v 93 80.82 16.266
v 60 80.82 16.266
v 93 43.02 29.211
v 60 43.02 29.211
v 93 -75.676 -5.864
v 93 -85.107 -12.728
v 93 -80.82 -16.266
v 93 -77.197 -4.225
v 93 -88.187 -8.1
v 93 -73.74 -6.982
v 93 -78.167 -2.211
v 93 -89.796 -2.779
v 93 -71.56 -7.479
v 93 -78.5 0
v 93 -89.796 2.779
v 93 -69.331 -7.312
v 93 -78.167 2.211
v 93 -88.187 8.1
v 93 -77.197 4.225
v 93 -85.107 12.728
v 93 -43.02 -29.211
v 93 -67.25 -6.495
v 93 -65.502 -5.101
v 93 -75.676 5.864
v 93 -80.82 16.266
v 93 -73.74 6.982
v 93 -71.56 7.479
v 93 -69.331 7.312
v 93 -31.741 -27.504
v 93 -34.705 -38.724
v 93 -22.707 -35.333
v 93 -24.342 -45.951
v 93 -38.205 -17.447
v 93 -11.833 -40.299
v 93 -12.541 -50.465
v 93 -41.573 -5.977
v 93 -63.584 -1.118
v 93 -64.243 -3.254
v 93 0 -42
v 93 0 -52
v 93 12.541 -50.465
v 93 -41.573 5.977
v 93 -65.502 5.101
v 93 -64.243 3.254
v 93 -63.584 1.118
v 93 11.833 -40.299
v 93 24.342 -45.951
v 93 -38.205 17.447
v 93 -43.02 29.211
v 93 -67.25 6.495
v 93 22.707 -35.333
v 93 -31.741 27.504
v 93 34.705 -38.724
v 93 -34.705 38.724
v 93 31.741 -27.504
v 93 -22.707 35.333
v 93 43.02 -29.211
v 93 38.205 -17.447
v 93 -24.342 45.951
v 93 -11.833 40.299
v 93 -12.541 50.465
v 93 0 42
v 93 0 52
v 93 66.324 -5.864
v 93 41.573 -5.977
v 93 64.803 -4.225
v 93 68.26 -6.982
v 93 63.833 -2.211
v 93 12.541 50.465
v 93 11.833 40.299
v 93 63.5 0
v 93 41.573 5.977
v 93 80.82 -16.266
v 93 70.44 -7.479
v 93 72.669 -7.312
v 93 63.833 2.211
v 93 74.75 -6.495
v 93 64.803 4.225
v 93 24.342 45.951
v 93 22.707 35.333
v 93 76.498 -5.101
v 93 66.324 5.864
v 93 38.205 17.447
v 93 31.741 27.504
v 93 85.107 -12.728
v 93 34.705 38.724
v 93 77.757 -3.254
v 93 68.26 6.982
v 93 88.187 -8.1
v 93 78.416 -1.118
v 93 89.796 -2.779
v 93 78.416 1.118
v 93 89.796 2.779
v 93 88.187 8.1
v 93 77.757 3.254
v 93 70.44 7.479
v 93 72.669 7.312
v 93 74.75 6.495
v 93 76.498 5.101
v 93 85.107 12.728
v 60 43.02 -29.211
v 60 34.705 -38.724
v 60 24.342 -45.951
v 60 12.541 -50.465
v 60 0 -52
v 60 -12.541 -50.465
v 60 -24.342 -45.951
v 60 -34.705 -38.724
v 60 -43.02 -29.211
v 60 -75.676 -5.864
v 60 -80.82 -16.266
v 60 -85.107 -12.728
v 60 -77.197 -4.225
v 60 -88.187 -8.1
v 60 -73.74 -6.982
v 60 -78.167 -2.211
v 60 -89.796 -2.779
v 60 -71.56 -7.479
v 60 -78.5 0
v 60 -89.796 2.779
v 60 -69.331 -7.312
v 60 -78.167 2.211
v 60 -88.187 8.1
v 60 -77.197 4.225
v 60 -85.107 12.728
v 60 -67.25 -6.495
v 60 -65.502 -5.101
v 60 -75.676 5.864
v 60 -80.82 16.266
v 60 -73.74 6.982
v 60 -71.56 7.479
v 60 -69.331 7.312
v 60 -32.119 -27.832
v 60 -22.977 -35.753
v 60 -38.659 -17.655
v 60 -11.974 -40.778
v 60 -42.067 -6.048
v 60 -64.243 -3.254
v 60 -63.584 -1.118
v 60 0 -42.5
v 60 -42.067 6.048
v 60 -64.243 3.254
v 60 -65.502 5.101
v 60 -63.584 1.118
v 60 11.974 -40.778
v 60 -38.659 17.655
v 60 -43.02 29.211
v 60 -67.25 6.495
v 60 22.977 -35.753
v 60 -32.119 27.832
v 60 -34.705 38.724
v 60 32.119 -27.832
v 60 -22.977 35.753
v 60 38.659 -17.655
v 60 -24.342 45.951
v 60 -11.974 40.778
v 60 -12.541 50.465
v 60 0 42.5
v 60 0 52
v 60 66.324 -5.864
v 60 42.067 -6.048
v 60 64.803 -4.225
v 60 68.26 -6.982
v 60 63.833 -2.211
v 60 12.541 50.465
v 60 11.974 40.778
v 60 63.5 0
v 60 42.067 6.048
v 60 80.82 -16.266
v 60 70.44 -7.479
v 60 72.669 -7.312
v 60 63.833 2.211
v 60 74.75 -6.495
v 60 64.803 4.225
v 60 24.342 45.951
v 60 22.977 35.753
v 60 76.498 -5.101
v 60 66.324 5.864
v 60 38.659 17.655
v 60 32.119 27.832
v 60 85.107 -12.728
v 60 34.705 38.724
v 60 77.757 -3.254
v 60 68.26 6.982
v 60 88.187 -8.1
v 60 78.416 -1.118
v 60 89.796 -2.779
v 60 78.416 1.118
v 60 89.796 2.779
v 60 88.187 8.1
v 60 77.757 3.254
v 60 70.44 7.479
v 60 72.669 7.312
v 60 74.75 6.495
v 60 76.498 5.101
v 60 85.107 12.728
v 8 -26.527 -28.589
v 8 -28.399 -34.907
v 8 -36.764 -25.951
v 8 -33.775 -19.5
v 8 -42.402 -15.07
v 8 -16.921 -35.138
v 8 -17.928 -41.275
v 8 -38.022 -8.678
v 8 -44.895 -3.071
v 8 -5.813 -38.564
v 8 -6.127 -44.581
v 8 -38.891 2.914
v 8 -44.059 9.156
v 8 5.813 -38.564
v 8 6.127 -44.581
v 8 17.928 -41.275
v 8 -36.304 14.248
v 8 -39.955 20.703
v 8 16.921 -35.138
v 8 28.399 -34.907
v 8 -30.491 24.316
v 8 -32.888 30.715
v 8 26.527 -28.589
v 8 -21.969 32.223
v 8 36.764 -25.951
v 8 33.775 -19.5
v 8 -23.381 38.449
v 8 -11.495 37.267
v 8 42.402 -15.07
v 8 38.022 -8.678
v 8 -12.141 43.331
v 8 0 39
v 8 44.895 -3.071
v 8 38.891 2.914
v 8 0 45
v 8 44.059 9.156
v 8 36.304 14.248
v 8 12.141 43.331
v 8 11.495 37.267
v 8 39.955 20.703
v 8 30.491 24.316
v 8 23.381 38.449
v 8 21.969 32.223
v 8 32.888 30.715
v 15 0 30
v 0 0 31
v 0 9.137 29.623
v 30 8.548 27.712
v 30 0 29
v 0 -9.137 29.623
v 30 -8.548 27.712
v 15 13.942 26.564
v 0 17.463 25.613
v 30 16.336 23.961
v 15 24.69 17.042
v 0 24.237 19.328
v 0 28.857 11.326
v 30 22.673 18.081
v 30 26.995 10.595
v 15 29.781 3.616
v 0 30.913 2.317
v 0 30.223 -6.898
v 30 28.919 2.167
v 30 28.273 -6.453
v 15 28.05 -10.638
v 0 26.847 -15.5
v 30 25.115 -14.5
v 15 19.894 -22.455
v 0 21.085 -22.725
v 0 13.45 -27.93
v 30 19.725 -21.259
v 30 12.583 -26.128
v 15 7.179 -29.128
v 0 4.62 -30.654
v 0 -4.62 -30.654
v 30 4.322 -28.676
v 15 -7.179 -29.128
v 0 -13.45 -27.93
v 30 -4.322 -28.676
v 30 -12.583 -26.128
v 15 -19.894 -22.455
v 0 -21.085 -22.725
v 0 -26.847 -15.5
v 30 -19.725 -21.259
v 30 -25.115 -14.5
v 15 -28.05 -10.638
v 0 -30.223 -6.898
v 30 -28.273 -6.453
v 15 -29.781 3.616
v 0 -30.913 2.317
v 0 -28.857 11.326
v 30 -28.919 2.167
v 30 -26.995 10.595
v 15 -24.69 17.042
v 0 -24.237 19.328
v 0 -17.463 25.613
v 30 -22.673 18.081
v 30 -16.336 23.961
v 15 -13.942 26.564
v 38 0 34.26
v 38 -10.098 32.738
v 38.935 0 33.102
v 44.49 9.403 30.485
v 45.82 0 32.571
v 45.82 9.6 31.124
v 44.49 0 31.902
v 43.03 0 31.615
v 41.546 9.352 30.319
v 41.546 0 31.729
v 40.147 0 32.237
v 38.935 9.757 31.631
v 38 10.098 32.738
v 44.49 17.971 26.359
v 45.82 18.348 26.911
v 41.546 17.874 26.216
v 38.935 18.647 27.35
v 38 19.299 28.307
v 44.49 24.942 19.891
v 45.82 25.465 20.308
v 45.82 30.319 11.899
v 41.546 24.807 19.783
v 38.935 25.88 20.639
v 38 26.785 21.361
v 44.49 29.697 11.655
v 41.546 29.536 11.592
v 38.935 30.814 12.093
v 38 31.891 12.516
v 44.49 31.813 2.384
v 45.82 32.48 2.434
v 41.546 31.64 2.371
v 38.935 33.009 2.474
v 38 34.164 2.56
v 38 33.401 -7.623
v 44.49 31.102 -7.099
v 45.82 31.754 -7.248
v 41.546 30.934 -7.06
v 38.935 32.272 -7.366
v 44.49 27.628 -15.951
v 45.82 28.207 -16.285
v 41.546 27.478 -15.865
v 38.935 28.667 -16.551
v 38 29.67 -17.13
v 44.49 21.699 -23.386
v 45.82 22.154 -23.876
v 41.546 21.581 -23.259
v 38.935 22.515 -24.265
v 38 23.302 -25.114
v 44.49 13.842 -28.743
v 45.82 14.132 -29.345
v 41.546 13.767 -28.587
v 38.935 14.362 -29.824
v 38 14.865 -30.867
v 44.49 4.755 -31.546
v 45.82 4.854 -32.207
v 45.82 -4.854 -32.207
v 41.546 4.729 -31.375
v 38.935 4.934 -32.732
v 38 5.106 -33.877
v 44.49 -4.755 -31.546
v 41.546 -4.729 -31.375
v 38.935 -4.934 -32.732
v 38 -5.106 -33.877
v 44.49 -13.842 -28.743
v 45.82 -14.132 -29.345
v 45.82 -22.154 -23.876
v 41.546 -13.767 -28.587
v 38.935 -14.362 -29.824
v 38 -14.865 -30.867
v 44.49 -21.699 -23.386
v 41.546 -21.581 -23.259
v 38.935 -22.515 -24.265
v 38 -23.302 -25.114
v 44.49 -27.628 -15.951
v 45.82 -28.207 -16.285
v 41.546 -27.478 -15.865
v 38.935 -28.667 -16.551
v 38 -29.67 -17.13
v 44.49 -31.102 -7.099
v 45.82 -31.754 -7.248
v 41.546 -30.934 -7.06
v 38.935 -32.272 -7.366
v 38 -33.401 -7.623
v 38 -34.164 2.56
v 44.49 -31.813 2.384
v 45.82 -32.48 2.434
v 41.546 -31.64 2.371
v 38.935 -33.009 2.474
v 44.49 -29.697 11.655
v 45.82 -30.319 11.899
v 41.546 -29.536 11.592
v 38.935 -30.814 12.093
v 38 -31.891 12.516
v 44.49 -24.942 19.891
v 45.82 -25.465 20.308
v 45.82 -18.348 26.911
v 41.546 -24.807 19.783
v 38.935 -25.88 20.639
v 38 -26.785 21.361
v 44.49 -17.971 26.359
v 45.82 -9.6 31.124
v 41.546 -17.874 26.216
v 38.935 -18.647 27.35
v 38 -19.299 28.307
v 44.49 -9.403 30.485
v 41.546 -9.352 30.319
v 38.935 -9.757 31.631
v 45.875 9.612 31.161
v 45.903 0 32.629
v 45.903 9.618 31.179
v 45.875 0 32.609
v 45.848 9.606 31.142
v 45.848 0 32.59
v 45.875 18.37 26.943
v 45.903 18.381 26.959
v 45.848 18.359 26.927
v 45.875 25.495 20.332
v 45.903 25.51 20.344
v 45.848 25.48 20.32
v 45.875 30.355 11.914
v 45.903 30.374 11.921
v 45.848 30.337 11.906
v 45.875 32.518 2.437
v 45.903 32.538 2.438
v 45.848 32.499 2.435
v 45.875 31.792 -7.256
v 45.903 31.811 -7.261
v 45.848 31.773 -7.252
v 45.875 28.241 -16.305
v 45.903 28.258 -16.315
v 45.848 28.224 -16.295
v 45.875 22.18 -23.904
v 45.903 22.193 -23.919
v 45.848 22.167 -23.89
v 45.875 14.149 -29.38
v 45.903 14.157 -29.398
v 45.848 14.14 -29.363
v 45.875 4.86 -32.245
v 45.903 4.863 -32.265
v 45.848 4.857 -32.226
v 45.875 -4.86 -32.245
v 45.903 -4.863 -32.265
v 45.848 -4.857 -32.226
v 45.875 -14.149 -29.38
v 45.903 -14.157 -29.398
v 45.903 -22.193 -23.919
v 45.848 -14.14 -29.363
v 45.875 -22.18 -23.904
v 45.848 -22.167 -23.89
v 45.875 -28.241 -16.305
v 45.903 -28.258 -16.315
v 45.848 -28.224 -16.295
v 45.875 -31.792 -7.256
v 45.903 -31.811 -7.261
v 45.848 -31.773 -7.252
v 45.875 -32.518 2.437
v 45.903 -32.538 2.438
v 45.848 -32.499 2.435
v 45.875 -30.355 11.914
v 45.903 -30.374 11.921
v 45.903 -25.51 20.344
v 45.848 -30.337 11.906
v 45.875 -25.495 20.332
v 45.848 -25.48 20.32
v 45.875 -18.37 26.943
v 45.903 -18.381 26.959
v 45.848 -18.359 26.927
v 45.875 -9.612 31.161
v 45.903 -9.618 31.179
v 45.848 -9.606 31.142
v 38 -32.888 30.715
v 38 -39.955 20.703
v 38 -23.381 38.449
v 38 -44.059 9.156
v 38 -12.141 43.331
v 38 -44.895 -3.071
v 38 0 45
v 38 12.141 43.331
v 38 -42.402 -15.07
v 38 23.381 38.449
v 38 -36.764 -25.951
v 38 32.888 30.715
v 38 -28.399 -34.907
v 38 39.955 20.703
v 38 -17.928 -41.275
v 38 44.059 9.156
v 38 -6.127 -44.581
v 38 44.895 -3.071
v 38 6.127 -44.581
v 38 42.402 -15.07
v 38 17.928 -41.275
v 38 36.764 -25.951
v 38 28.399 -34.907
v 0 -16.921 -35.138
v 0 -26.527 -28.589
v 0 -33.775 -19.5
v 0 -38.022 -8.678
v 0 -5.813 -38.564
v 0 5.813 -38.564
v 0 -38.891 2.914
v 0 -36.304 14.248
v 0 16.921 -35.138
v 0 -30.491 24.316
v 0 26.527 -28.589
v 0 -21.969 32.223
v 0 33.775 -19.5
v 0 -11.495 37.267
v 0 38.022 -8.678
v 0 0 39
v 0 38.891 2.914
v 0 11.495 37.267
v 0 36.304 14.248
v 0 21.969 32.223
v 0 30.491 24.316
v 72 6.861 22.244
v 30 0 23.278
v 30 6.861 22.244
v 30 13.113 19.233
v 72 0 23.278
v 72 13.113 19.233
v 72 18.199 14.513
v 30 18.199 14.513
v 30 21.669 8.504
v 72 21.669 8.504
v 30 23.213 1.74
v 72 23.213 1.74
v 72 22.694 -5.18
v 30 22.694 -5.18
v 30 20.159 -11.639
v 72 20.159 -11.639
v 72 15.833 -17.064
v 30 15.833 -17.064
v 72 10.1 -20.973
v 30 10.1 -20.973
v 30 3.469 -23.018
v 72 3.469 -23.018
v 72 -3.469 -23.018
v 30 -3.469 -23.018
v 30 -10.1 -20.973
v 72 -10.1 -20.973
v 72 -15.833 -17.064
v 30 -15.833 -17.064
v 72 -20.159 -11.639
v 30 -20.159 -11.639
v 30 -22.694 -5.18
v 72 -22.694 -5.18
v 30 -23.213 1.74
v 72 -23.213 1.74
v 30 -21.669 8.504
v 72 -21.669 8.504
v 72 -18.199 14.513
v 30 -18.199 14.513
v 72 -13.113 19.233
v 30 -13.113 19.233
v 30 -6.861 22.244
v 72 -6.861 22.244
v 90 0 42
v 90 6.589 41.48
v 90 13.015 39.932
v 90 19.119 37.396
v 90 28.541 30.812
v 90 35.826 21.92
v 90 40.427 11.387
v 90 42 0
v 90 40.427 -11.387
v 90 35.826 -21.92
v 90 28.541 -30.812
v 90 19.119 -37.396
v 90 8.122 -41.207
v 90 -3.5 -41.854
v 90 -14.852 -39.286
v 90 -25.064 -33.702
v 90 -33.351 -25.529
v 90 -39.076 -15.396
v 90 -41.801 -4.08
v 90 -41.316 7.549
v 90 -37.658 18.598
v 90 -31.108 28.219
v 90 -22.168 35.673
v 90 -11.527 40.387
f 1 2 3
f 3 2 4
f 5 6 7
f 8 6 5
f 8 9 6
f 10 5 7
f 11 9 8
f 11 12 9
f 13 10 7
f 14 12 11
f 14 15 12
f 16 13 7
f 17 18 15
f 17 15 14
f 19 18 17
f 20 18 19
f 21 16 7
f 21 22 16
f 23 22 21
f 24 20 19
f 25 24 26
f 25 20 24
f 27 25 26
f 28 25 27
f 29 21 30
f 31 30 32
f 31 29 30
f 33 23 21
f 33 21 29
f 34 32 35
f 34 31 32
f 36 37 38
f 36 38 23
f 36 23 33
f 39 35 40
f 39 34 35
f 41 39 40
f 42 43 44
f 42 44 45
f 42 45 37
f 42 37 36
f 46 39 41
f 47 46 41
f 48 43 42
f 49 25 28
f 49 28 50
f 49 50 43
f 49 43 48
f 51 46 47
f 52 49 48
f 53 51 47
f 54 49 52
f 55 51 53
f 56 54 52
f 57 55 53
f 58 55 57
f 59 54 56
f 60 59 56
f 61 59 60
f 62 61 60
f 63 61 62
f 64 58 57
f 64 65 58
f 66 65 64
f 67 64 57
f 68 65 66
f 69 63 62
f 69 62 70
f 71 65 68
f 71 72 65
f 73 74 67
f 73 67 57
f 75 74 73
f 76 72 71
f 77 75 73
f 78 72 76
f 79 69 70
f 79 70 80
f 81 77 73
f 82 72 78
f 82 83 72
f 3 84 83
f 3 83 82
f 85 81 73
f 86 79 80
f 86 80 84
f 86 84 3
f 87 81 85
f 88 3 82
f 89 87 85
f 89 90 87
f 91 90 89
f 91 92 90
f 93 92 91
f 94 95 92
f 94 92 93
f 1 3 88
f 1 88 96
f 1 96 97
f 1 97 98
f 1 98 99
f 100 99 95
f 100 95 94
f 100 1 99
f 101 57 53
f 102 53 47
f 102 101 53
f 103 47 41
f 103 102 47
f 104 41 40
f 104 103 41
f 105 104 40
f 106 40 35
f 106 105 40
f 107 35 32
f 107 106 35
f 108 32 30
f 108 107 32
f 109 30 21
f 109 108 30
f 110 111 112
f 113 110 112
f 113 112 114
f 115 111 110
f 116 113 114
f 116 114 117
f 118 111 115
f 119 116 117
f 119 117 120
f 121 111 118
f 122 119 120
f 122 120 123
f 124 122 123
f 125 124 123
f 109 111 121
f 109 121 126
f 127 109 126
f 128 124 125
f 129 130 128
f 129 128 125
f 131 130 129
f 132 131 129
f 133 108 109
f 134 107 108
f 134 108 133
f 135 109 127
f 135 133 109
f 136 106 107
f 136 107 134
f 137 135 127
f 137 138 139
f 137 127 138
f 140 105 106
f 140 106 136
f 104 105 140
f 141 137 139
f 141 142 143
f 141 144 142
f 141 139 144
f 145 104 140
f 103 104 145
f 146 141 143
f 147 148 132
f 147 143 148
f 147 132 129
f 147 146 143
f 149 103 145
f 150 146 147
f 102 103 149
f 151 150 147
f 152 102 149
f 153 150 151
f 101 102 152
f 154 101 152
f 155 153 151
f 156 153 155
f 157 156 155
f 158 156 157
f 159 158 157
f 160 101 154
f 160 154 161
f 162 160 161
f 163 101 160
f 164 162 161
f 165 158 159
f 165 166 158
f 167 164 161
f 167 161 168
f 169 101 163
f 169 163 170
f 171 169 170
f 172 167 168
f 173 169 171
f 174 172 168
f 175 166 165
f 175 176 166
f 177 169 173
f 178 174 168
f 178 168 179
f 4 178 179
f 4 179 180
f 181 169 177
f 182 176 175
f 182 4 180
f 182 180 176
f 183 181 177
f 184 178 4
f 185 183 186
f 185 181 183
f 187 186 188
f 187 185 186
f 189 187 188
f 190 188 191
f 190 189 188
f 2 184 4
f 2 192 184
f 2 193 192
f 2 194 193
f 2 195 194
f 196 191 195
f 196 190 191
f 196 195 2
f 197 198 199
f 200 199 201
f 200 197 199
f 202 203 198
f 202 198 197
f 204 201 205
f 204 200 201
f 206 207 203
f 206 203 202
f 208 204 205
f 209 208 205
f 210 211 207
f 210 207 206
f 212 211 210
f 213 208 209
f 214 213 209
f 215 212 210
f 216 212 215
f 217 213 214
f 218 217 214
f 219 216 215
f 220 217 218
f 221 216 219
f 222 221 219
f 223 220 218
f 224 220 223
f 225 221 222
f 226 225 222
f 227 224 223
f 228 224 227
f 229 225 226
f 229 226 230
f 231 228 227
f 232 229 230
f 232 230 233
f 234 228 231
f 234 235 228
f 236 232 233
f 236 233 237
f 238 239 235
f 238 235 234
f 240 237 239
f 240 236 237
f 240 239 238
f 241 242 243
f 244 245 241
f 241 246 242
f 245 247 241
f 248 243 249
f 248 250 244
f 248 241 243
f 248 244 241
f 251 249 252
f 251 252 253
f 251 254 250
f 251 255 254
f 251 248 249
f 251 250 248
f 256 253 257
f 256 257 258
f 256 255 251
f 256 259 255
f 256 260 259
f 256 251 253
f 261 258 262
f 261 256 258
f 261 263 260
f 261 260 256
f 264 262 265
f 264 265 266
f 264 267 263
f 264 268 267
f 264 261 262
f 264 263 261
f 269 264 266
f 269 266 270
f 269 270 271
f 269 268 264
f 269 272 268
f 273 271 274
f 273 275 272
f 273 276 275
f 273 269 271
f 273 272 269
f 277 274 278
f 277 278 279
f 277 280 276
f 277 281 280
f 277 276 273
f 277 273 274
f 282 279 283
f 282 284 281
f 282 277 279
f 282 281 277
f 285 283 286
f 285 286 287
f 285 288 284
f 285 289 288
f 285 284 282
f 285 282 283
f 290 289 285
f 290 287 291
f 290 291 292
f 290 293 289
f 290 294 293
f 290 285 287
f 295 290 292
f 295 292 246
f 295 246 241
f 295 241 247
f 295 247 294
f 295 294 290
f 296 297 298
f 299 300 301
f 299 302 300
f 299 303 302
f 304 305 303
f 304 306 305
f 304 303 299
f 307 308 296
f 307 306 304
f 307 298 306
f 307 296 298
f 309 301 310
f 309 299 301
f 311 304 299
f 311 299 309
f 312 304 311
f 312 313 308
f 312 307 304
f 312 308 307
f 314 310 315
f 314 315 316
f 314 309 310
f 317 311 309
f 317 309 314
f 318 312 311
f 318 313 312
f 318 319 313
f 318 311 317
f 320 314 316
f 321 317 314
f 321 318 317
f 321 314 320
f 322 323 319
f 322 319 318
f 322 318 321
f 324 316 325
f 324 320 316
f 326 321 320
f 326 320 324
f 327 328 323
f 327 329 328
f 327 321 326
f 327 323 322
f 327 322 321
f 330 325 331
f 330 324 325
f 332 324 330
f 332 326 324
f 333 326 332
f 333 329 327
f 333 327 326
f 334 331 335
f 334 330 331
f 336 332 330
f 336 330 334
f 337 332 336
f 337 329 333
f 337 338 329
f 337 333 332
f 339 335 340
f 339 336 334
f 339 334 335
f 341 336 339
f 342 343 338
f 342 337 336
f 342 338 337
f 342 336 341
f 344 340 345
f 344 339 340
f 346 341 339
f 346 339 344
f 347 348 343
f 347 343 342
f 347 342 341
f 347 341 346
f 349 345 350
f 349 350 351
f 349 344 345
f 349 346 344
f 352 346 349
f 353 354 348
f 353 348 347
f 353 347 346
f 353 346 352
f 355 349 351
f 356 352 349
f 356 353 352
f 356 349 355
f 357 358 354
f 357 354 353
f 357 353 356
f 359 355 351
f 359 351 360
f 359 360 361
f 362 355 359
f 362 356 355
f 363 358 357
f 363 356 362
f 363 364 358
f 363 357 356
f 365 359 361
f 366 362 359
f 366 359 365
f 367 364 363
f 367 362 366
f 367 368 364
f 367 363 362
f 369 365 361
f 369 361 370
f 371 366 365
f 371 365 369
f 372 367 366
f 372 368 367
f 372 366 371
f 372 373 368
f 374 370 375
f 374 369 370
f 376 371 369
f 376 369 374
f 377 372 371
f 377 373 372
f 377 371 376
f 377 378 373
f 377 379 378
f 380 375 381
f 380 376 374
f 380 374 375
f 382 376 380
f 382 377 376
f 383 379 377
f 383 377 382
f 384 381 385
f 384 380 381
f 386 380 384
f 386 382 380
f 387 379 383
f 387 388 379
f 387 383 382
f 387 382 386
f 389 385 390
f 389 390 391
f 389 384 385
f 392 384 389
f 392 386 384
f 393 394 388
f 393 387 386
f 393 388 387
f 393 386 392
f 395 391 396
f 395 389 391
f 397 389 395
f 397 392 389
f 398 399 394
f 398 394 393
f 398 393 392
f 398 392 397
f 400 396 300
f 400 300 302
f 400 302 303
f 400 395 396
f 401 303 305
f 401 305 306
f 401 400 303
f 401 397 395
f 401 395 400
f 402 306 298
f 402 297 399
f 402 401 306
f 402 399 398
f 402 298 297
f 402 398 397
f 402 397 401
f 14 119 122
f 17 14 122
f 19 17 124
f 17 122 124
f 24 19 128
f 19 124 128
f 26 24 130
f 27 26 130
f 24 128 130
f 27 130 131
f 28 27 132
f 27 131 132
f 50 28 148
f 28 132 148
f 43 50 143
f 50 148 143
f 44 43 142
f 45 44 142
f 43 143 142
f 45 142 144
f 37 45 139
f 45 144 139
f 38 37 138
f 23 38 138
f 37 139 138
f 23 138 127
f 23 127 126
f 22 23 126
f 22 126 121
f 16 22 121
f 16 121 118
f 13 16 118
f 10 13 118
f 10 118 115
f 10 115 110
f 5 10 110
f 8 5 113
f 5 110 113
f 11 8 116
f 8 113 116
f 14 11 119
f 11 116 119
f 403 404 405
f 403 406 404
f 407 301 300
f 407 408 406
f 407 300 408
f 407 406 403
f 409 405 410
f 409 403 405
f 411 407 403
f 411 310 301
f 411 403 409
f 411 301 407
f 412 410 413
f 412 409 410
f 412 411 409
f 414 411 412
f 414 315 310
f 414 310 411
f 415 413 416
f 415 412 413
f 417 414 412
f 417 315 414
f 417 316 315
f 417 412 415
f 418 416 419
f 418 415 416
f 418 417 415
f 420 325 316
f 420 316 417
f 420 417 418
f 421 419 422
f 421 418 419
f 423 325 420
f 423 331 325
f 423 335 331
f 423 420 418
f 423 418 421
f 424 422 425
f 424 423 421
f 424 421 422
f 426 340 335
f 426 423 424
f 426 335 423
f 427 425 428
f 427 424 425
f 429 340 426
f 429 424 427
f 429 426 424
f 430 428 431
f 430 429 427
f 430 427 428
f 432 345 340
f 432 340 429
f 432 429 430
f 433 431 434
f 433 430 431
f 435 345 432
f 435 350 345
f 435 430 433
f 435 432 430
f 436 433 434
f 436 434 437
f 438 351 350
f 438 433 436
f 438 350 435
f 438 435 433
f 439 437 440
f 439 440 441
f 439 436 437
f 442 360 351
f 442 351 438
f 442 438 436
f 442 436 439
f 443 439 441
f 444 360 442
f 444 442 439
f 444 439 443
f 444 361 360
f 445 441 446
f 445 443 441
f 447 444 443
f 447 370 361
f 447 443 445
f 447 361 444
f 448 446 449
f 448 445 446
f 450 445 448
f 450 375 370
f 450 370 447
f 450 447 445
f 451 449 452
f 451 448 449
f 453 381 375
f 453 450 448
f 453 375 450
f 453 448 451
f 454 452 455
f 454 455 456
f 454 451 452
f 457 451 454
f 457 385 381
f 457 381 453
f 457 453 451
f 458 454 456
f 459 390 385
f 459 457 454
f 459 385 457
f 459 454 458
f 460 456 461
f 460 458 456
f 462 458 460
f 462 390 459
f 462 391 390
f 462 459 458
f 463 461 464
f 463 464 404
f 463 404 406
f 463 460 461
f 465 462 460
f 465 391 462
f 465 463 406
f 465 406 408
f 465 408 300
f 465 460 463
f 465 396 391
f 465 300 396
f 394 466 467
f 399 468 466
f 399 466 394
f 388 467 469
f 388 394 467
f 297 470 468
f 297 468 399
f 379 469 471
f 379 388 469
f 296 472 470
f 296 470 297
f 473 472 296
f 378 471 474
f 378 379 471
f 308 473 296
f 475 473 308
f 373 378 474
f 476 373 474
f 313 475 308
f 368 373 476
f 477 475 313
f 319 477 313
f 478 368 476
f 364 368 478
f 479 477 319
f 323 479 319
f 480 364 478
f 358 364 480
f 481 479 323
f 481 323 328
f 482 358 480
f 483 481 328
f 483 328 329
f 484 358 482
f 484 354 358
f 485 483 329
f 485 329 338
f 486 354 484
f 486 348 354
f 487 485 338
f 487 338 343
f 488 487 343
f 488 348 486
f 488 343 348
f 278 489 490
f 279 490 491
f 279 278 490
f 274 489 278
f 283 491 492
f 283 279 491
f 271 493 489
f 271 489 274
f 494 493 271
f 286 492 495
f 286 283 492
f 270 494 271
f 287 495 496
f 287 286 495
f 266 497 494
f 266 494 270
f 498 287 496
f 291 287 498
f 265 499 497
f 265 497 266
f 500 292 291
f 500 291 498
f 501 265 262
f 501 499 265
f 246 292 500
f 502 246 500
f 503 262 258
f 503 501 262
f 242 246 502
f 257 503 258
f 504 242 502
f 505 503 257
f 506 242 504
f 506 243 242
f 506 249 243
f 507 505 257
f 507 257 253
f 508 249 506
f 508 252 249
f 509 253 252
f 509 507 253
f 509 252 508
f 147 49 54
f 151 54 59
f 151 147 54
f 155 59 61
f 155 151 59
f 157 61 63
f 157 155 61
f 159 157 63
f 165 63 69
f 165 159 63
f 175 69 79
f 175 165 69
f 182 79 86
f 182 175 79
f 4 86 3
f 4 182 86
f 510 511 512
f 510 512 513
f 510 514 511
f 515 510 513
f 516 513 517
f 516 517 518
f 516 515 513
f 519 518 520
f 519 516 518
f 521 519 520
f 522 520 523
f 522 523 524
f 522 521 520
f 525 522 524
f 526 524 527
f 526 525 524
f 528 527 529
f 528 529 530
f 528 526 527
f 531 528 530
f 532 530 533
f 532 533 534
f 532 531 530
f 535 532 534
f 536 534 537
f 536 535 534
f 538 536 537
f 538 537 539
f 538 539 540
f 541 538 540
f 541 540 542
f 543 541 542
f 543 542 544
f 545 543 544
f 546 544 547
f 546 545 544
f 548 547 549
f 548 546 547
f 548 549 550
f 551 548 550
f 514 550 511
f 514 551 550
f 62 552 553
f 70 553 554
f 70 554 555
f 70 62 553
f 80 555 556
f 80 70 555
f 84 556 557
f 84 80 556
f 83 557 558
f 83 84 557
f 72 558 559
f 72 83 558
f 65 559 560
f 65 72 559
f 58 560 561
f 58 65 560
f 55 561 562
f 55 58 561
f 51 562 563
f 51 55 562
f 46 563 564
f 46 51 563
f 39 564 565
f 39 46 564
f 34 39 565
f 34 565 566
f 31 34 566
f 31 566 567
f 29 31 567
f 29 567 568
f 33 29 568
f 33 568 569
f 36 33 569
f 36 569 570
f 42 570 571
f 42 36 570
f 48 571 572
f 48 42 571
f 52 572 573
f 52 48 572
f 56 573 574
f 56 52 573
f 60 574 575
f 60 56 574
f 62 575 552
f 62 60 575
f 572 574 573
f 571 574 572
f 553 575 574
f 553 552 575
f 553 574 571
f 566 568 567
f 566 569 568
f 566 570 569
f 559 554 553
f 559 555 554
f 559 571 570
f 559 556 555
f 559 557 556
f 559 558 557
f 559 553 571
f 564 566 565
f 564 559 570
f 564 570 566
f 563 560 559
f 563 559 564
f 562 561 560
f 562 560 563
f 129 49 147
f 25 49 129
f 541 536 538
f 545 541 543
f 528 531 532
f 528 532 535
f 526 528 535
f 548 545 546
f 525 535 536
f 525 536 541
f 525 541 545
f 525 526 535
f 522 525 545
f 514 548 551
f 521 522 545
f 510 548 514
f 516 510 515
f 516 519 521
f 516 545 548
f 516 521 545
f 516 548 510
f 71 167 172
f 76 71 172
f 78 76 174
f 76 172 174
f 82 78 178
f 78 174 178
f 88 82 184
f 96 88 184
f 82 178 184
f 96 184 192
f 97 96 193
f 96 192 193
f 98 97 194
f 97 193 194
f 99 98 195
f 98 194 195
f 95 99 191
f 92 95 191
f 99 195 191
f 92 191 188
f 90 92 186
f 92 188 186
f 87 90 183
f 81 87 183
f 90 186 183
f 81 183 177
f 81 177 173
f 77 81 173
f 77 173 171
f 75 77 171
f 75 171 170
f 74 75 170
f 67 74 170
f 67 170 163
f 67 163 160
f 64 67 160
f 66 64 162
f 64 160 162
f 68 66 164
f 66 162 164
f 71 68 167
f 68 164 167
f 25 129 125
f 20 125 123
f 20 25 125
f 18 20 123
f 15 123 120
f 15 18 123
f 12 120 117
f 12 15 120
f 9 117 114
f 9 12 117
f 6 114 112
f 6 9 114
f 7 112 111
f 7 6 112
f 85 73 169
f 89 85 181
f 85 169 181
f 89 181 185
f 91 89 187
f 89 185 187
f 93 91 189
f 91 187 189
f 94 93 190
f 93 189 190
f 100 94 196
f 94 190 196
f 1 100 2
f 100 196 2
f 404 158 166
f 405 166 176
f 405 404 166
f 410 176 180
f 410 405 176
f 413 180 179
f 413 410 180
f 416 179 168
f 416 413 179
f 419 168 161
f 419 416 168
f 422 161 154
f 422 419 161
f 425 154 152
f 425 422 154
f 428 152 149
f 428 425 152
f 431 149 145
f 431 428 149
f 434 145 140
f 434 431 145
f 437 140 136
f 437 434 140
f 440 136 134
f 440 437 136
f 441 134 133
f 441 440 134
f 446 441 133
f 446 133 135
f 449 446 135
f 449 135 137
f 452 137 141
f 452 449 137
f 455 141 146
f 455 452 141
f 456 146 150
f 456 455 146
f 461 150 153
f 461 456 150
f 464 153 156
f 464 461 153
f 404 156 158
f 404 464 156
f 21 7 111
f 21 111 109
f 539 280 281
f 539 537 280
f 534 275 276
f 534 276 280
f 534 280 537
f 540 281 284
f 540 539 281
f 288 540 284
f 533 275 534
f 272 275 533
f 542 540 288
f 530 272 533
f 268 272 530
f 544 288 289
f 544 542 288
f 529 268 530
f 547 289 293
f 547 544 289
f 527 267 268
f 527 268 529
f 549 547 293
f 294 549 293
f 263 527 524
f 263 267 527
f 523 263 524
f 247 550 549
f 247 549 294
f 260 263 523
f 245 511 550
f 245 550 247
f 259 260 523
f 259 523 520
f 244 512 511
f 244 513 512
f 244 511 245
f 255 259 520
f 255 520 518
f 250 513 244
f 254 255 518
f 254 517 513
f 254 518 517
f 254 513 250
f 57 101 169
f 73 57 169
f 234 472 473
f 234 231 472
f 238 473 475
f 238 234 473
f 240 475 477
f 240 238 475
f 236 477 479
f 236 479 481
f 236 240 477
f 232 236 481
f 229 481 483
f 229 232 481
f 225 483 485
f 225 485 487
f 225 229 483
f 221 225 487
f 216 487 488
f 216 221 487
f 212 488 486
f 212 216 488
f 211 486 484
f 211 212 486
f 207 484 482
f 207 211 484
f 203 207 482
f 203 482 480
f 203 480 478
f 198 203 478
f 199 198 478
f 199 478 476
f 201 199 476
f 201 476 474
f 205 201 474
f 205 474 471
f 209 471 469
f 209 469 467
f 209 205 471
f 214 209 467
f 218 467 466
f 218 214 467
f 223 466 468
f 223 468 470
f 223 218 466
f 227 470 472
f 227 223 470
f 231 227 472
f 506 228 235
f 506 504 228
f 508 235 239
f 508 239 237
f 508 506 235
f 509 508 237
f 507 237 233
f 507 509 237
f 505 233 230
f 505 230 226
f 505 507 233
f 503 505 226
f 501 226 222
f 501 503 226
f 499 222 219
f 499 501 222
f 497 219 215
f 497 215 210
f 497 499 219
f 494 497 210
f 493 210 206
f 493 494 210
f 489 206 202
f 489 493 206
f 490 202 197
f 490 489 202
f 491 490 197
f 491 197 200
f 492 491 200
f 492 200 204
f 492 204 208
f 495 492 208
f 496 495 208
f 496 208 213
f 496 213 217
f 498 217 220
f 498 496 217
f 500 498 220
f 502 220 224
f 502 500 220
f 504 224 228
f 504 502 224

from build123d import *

# Parameters (mm, degrees)
F2_R     = 7.5
F3_DEPTH = 30
F4_DEPTH = 3
F5_R     = 7.5
F6_DEPTH = 33
F7_R     = 7.5
F8_DEPTH = 33


with BuildPart() as f1:
    # F0 (on Front) → F1 (revolve)
    with BuildSketch(Plane.XZ):
        with BuildLine():
            Line((0, 39), (0, 31))
            Line((0, 31), (30, 29))
            Line((30, 29), (30, 23.2778316429))
            Line((30, 23.2778316429), (72, 23.2778316429))
            Line((72, 23.2778316429), (72, 0))
            Line((72, 0), (90, 0))
            Line((90, 0), (90, 42))
            Line((90, 42), (93, 42))
            Line((93, 42), (93, 52))
            Line((93, 52), (60, 52))
            Line((60, 52), (60, 42.5))
            Line((60, 42.5), (45.9028487651, 32.629068438))
            ThreePointArc((45.9028487651, 32.629068438), (45.8614157942, 32.5997709837), (45.8197142818, 32.5708570462))
            ThreePointArc((45.8197142818, 32.5708570462), (41.5456906901, 31.7290536585), (38, 34.2596638885))
            Line((38, 34.2596638885), (38, 45))
            Line((38, 45), (8, 45))
            Line((8, 45), (8, 39))
            Line((8, 39), (0, 39))
        make_face()
    revolve(axis=Axis((81, 0, 0), (-1, 0, 0)))

    # F2 (on face) → F3 (join)
    with BuildSketch(Plane.YZ.offset(90)):
        with BuildLine():
            Line((-19.1190099356, 37.3960353391), (-80.8199036363, 16.2655922909))
            ThreePointArc((-80.8199036363, 16.2655922909), (-90, 0), (-80.8199036363, -16.2655922909))
            Line((-80.8199036363, -16.2655922909), (-19.1190099356, -37.3960353391))
            ThreePointArc((-19.1190099356, -37.3960353391), (-42, 0), (-19.1190099356, 37.3960353391))
        make_face()
        with Locations((-71, 0)):
            Circle(F2_R, mode=Mode.SUBTRACT)
        with BuildLine():
            Line((80.8199036363, 16.2655922909), (19.1190099356, 37.3960353391))
            ThreePointArc((19.1190099356, 37.3960353391), (35.825957191, 21.9203282674), (42, 0))
            ThreePointArc((42, 0), (35.825957191, -21.9203282674), (19.1190099356, -37.3960353391))
            Line((19.1190099356, -37.3960353391), (80.8199036363, -16.2655922909))
            ThreePointArc((80.8199036363, -16.2655922909), (90, 0), (80.8199036363, 16.2655922909))
        make_face()
        with Locations((71, 0)):
            Circle(F2_R, mode=Mode.SUBTRACT)
        with Locations((-71, 0)):
            Circle(F2_R)
        with Locations((71, 0)):
            Circle(F2_R)
    extrude(amount=-F3_DEPTH)

    # F4 (add): faces of the model
    f4_faces = [f1.faces().sort_by_distance(p)[0] for p in [
        (90, 66.461472241, 0),
        (90, -66.461472241, 0),
    ]]
    extrude(f4_faces, amount=F4_DEPTH)

    # F5 (on face) → F6 (cut)
    with BuildSketch(Plane(origin=(60, 0, 0), x_dir=(0, -1, 0), z_dir=(-1, 0, 0))):
        with Locations((-71, 0)):
            Circle(F5_R)
    extrude(amount=-F6_DEPTH, mode=Mode.SUBTRACT)

    # F7 (on face) → F8 (cut)
    with BuildSketch(Plane(origin=(60, 0, 0), x_dir=(0, -1, 0), z_dir=(-1, 0, 0))):
        with Locations((71, 0)):
            Circle(F7_R)
    extrude(amount=-F8_DEPTH, mode=Mode.SUBTRACT)


solid = f1.part
